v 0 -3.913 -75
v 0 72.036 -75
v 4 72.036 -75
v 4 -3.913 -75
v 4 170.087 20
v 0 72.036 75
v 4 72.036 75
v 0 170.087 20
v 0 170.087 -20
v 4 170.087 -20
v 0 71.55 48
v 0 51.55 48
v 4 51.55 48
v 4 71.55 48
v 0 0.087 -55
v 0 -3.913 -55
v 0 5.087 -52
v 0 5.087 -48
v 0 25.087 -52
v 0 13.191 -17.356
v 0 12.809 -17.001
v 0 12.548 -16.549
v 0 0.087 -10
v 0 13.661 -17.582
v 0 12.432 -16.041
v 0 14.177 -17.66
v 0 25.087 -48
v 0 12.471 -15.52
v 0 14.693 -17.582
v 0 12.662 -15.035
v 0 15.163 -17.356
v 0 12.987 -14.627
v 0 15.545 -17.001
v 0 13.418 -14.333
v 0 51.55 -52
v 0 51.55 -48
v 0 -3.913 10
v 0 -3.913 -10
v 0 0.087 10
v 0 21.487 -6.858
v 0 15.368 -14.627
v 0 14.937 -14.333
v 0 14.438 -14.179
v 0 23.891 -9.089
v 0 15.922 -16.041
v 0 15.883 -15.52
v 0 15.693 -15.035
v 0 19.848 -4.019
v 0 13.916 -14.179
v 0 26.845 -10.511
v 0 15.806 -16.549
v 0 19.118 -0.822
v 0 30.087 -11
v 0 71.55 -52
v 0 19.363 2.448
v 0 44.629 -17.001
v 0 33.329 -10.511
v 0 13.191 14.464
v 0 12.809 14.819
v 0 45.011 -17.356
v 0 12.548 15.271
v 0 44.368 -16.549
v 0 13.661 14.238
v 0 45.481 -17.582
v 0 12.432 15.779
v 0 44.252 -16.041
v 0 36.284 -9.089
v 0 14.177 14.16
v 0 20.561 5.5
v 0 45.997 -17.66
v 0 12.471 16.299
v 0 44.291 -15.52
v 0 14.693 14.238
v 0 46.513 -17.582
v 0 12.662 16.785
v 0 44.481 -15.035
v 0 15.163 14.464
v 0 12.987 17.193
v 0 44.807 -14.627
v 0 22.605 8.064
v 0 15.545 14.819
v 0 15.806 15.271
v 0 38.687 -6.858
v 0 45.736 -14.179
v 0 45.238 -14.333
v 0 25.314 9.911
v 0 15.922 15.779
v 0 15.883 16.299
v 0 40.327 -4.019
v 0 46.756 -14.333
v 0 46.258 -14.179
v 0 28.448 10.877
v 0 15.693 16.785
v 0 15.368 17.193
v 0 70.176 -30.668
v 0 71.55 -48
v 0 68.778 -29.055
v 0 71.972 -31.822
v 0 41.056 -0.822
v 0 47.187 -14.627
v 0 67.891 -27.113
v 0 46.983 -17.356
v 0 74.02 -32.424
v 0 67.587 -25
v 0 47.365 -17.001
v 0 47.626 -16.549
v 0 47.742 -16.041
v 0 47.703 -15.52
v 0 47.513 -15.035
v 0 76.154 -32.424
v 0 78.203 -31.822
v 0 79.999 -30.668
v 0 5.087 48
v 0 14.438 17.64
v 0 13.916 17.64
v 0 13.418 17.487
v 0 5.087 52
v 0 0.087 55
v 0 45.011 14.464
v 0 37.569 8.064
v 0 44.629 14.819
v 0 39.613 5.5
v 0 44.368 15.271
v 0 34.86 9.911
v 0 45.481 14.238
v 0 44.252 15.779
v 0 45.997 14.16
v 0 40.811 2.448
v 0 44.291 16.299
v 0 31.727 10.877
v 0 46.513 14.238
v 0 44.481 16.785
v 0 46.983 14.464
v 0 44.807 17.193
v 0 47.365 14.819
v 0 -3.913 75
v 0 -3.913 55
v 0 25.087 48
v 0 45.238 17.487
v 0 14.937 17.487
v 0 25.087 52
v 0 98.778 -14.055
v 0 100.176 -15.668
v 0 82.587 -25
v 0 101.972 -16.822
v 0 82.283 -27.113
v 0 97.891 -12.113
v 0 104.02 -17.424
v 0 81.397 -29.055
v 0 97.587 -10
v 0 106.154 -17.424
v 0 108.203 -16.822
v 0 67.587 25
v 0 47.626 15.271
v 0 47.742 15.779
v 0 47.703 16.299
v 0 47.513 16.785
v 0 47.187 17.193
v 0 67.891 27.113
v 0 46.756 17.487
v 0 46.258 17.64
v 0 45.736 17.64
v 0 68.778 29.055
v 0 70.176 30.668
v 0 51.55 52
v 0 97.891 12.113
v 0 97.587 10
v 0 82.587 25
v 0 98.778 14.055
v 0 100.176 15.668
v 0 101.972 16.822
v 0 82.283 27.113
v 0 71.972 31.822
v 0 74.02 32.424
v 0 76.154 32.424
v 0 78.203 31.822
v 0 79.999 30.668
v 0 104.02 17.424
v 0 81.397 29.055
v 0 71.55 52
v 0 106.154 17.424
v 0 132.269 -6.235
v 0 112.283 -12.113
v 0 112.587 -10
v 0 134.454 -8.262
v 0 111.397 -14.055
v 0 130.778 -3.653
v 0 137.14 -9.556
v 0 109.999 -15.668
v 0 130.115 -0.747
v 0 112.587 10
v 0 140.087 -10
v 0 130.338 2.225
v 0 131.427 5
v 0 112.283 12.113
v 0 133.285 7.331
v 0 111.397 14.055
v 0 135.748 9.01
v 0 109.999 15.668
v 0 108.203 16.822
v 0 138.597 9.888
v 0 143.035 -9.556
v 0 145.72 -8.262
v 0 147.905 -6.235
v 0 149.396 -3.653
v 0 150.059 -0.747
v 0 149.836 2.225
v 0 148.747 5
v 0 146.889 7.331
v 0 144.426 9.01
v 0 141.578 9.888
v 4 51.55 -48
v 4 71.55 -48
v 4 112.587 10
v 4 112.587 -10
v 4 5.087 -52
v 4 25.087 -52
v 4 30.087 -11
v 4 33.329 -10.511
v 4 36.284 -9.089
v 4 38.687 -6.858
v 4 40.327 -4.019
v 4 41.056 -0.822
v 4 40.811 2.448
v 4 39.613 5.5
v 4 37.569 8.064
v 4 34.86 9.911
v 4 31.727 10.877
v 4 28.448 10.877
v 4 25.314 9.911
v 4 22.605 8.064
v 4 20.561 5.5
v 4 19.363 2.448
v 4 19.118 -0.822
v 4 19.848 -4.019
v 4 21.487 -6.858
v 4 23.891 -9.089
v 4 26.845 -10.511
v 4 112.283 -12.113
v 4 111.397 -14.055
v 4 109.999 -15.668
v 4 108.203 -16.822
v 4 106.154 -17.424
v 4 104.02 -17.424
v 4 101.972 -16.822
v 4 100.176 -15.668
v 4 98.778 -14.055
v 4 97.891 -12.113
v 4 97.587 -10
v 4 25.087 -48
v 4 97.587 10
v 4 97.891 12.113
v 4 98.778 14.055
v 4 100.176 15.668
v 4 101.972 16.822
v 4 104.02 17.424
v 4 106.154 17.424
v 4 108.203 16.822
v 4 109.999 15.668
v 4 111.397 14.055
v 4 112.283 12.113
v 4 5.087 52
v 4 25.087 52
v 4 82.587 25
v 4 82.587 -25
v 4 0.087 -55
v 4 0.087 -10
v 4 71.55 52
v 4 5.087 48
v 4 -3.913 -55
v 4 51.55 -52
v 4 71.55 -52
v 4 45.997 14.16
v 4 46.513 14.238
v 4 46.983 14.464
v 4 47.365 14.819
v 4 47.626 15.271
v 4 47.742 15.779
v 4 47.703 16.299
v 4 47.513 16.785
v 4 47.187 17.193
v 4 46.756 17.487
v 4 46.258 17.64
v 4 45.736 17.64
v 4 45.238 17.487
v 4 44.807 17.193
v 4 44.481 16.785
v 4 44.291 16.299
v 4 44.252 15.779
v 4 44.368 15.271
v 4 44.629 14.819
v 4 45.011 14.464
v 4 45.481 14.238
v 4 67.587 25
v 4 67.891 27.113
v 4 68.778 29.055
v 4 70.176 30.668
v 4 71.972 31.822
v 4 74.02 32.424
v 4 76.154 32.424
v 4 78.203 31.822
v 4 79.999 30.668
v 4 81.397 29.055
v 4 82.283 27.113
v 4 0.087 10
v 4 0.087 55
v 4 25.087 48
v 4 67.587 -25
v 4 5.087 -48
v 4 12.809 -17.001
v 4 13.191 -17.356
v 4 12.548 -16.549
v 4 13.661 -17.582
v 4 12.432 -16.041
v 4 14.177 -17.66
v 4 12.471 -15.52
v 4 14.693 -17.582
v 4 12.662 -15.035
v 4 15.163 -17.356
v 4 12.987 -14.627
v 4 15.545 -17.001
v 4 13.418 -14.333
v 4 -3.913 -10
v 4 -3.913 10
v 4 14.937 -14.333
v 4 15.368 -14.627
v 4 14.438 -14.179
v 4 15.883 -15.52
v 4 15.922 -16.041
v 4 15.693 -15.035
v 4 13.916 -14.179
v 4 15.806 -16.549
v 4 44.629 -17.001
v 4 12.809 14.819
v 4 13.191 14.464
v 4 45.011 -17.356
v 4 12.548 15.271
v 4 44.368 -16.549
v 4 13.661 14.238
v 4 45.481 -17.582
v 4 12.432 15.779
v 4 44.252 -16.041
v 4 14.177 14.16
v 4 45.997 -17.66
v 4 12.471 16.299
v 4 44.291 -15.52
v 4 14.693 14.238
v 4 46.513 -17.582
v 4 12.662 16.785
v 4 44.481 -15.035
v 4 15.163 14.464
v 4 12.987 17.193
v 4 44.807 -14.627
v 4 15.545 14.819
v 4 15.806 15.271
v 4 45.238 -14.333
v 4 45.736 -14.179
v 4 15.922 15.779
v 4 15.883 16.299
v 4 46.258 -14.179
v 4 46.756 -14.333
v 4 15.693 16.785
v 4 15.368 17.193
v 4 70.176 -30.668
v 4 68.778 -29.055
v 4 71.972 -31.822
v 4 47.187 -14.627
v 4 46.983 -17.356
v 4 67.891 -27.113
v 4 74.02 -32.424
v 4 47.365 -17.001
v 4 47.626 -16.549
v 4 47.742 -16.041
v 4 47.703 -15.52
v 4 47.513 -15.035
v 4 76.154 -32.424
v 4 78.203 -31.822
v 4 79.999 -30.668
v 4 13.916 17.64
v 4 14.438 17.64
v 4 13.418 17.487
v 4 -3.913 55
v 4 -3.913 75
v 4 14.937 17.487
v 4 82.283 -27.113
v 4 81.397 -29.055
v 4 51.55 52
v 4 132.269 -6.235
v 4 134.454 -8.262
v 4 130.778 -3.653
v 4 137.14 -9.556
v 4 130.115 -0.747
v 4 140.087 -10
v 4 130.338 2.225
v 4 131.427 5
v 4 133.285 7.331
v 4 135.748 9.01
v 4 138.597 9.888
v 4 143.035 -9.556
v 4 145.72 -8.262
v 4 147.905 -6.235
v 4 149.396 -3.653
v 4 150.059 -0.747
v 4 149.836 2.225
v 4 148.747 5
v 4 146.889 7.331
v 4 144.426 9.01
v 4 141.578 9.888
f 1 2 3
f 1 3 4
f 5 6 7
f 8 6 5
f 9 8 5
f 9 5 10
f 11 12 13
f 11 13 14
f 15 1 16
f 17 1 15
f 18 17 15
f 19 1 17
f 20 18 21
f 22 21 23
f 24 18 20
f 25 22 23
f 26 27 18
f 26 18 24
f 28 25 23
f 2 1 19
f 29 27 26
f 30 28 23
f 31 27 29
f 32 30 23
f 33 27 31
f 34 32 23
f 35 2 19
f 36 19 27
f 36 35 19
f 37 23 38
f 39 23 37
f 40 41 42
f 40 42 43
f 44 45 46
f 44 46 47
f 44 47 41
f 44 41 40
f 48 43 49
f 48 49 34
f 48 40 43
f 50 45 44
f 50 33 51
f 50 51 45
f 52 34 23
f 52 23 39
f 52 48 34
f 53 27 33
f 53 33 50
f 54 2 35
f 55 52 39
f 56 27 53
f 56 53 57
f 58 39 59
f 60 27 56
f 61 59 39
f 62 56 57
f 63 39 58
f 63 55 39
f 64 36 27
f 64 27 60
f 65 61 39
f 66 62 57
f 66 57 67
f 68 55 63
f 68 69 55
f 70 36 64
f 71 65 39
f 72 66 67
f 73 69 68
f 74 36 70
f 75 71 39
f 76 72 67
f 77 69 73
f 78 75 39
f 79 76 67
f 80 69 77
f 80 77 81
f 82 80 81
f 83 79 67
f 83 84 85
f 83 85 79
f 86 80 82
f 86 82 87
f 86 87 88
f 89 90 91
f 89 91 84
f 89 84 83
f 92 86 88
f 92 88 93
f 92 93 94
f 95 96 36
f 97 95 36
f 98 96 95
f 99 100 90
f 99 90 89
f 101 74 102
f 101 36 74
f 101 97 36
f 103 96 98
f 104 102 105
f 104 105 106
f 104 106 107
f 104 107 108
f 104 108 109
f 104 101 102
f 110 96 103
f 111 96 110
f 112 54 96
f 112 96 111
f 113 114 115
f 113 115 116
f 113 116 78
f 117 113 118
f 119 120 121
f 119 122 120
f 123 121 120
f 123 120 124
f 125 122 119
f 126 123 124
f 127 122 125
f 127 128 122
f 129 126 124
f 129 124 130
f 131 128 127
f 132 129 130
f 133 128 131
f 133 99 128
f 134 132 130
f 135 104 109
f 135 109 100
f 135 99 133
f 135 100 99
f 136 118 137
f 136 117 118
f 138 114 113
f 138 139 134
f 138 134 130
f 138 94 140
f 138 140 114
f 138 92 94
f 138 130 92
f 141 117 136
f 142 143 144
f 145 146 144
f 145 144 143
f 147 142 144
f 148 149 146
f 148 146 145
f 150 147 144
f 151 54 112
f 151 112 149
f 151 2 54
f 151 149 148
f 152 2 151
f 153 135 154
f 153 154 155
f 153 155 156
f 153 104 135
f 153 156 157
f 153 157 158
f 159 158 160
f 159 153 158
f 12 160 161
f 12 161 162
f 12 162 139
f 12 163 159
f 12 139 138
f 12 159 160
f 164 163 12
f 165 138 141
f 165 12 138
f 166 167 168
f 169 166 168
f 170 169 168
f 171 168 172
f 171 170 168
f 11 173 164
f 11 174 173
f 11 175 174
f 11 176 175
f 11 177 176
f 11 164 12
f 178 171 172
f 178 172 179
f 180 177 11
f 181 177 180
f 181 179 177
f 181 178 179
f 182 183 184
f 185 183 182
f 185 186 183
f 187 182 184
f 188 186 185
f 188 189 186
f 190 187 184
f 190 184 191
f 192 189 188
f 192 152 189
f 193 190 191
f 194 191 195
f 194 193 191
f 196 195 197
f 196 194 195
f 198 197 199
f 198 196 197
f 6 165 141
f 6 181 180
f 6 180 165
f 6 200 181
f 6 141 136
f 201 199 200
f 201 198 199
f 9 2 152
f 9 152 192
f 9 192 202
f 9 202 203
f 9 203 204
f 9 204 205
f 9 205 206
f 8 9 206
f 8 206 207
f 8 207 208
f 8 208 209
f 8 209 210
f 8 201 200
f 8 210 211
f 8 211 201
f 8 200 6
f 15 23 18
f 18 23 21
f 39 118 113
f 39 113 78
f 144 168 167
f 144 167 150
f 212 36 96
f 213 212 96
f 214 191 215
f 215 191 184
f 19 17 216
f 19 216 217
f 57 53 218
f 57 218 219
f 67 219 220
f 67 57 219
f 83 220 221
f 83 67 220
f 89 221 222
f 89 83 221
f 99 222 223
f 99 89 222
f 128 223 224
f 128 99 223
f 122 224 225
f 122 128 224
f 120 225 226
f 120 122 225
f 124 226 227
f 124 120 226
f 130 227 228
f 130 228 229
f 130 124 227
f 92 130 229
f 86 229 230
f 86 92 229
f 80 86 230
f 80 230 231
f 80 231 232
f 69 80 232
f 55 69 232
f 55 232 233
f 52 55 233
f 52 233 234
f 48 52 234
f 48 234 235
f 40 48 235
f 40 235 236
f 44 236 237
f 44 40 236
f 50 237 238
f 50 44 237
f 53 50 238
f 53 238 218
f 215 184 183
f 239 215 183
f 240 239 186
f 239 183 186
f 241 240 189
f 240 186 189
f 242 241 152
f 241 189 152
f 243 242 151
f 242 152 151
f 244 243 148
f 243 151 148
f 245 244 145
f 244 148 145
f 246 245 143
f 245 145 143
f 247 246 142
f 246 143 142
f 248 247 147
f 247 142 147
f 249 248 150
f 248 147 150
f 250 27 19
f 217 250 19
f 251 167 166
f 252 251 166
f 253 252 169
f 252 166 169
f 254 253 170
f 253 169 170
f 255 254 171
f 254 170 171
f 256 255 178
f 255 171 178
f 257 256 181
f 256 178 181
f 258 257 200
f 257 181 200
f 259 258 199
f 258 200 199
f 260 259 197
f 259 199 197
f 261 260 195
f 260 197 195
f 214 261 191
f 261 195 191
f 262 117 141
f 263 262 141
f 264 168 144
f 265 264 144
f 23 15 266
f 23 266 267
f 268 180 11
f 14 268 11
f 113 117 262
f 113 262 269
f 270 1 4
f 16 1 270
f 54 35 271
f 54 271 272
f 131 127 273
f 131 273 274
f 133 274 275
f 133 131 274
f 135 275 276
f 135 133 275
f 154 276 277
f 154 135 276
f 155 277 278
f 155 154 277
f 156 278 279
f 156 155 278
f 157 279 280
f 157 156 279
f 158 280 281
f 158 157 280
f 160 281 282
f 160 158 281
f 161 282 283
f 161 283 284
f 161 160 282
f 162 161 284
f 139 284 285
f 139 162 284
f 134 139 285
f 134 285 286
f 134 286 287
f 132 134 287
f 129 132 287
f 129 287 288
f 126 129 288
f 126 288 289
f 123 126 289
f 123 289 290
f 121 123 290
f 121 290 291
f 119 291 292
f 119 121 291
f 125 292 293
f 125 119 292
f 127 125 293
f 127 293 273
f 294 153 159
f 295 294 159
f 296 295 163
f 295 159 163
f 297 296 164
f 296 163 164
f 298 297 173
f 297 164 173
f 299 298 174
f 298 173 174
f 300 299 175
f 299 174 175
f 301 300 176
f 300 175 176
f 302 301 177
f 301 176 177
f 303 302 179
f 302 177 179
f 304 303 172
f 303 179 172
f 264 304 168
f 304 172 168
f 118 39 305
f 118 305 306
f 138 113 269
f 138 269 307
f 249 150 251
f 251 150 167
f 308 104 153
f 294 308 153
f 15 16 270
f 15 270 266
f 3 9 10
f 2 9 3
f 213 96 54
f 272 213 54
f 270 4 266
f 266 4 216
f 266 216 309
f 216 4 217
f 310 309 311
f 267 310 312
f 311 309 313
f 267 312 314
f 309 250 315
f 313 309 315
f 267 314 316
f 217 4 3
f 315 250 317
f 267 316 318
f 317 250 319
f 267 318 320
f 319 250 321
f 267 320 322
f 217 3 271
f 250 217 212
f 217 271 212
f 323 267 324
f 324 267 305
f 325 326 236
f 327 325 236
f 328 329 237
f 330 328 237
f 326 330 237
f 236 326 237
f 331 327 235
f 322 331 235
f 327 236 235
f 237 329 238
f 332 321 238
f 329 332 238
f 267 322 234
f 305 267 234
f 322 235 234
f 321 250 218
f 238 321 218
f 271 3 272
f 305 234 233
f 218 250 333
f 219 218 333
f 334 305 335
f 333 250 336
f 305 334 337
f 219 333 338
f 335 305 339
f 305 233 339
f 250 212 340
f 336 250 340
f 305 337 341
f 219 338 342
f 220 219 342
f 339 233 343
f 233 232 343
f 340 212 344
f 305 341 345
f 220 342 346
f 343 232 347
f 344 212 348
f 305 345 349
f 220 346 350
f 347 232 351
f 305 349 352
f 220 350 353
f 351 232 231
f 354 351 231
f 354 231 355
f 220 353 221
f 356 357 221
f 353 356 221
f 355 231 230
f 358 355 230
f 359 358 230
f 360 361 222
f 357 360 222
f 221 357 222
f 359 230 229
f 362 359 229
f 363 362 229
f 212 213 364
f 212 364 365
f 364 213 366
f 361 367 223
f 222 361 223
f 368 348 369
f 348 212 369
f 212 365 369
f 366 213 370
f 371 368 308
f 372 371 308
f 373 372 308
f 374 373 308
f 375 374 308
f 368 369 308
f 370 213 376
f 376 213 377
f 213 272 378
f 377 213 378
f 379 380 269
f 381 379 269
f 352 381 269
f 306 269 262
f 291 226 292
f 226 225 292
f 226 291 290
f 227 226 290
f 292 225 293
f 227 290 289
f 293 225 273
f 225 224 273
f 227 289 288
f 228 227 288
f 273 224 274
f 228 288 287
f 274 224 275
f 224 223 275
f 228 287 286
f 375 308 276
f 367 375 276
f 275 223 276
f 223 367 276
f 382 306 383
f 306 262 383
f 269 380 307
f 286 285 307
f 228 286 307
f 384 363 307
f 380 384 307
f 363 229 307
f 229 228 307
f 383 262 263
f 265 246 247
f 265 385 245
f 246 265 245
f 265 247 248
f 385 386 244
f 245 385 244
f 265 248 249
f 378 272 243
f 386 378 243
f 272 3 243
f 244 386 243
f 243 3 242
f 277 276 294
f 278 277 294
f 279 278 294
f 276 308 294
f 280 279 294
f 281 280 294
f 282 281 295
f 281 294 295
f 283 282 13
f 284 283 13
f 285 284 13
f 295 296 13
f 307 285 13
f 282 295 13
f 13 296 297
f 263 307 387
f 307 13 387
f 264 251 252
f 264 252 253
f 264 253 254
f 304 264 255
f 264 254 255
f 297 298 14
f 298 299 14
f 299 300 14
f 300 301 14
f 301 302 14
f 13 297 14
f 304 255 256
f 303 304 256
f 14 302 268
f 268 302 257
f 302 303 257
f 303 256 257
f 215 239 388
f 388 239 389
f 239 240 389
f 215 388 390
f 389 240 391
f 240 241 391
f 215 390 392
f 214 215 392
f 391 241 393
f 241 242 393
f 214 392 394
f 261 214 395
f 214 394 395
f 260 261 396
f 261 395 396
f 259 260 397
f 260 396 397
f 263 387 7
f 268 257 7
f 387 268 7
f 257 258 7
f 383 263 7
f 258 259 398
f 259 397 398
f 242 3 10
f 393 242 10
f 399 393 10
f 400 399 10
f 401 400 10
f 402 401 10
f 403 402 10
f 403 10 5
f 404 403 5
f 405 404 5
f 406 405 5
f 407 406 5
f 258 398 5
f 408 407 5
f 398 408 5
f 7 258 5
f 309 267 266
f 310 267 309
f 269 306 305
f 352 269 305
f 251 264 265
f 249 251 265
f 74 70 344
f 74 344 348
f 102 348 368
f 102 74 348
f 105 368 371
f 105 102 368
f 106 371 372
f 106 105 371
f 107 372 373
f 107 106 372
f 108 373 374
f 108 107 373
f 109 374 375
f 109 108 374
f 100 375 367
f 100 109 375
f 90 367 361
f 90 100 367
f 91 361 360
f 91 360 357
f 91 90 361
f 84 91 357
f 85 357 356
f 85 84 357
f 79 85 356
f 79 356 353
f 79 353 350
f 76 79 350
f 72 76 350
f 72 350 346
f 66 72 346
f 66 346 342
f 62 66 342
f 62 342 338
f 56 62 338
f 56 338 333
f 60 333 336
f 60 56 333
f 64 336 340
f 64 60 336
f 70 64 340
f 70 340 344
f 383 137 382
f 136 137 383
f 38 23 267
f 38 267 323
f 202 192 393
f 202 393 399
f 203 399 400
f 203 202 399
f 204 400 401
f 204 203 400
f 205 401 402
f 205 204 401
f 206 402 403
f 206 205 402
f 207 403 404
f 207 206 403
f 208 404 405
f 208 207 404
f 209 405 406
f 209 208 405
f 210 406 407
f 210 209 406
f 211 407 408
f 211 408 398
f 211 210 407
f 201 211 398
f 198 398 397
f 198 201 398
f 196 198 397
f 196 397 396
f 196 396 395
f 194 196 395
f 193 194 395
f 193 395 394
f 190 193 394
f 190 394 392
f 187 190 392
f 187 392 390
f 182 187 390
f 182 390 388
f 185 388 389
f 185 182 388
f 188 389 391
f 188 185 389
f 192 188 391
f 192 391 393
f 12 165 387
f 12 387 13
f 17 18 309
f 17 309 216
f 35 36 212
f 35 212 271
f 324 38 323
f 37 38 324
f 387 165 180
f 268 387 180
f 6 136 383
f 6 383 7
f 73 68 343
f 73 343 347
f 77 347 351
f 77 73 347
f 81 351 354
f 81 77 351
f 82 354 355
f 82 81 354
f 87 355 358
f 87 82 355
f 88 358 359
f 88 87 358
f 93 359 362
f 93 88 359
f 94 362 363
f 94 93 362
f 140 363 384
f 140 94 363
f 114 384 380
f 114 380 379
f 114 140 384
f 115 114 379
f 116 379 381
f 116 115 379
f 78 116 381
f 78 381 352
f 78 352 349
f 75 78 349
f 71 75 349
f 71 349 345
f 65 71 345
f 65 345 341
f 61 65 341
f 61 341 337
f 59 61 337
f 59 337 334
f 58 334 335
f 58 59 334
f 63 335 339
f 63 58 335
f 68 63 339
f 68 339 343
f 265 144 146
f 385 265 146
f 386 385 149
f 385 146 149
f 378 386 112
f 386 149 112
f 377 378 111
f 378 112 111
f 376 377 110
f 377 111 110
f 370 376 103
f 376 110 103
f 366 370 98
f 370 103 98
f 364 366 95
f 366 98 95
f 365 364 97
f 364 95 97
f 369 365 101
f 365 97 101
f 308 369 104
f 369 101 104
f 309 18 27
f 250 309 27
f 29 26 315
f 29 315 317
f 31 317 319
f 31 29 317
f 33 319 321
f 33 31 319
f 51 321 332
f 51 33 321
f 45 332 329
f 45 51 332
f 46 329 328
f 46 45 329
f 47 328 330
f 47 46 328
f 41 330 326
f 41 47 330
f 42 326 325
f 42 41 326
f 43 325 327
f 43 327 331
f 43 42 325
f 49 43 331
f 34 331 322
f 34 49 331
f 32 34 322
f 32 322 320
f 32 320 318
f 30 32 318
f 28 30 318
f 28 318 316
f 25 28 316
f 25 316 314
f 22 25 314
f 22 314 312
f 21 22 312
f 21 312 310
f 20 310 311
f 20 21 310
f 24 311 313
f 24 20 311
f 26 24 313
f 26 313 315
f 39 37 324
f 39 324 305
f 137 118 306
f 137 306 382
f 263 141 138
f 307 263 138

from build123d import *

# Parameters (mm, degrees)
SKETCH1_R           = 11
SKETCH1_R_2         = 10
SKETCH1_R_3         = 1.75
SKETCH1_W           = 4
SKETCH1_H           = 20
BOSS_EXTRUDE1_DEPTH = 4


with BuildPart() as part:
    # Sketch1 → Boss-Extrude1 (new body)
    with BuildSketch(Plane(origin=(0, 0, 0), x_dir=(0, 0, -1), z_dir=(1, 0, 0))):
        Polygon((-20, 170.087118875), (20, 170.087118875), (75, 72.036415883), (75, -3.912881125), (55, -3.912881125), (55, 0.087118875), (10, 0.087118875), (10, -3.912881125), (-10, -3.912881125), (-10, 0.087118875), (-55, 0.087118875), (-55, -3.912881125), (-75, -3.912881125), (-75, 72.036415883), align=None)
        with Locations((0, 30.087118875)):
            Circle(SKETCH1_R, mode=Mode.SUBTRACT)
        with Locations((0, 140.087118875)):
            Circle(SKETCH1_R_2, mode=Mode.SUBTRACT)
        with Locations((-15.909902577, 45.997021452)):
            Circle(SKETCH1_R_3, mode=Mode.SUBTRACT)
        with Locations((-15.909902577, 14.177216298)):
            Circle(SKETCH1_R_3, mode=Mode.SUBTRACT)
        with Locations((15.909902577, 14.177216298)):
            Circle(SKETCH1_R_3, mode=Mode.SUBTRACT)
        with Locations((15.909902577, 45.997021452)):
            Circle(SKETCH1_R_3, mode=Mode.SUBTRACT)
        with BuildLine():
            Line((-10, 112.587118875), (10, 112.587118875))
            ThreePointArc((10, 112.587118875), (17.5, 105.087118875), (10, 97.587118875))
            Line((10, 97.587118875), (-10, 97.587118875))
            ThreePointArc((-10, 97.587118875), (-17.5, 105.087118875), (-10, 112.587118875))
        make_face(mode=Mode.SUBTRACT)
        with BuildLine():
            Line((-25, 82.587118875), (25, 82.587118875))
            ThreePointArc((25, 82.587118875), (32.5, 75.087118875), (25, 67.587118875))
            Line((25, 67.587118875), (-25, 67.587118875))
            ThreePointArc((-25, 67.587118875), (-32.5, 75.087118875), (-25, 82.587118875))
        make_face(mode=Mode.SUBTRACT)
        with Locations((-50, 15.087118875)):
            Rectangle(SKETCH1_W, SKETCH1_H, mode=Mode.SUBTRACT)
        with Locations((50, 15.087118875)):
            Rectangle(SKETCH1_W, SKETCH1_H, mode=Mode.SUBTRACT)
        with Locations((-50, 61.549860891)):
            Rectangle(SKETCH1_W, SKETCH1_H, mode=Mode.SUBTRACT)
        with Locations((50, 61.549860891)):
            Rectangle(SKETCH1_W, SKETCH1_H, mode=Mode.SUBTRACT)
    extrude(amount=BOSS_EXTRUDE1_DEPTH)


solid = part.part
